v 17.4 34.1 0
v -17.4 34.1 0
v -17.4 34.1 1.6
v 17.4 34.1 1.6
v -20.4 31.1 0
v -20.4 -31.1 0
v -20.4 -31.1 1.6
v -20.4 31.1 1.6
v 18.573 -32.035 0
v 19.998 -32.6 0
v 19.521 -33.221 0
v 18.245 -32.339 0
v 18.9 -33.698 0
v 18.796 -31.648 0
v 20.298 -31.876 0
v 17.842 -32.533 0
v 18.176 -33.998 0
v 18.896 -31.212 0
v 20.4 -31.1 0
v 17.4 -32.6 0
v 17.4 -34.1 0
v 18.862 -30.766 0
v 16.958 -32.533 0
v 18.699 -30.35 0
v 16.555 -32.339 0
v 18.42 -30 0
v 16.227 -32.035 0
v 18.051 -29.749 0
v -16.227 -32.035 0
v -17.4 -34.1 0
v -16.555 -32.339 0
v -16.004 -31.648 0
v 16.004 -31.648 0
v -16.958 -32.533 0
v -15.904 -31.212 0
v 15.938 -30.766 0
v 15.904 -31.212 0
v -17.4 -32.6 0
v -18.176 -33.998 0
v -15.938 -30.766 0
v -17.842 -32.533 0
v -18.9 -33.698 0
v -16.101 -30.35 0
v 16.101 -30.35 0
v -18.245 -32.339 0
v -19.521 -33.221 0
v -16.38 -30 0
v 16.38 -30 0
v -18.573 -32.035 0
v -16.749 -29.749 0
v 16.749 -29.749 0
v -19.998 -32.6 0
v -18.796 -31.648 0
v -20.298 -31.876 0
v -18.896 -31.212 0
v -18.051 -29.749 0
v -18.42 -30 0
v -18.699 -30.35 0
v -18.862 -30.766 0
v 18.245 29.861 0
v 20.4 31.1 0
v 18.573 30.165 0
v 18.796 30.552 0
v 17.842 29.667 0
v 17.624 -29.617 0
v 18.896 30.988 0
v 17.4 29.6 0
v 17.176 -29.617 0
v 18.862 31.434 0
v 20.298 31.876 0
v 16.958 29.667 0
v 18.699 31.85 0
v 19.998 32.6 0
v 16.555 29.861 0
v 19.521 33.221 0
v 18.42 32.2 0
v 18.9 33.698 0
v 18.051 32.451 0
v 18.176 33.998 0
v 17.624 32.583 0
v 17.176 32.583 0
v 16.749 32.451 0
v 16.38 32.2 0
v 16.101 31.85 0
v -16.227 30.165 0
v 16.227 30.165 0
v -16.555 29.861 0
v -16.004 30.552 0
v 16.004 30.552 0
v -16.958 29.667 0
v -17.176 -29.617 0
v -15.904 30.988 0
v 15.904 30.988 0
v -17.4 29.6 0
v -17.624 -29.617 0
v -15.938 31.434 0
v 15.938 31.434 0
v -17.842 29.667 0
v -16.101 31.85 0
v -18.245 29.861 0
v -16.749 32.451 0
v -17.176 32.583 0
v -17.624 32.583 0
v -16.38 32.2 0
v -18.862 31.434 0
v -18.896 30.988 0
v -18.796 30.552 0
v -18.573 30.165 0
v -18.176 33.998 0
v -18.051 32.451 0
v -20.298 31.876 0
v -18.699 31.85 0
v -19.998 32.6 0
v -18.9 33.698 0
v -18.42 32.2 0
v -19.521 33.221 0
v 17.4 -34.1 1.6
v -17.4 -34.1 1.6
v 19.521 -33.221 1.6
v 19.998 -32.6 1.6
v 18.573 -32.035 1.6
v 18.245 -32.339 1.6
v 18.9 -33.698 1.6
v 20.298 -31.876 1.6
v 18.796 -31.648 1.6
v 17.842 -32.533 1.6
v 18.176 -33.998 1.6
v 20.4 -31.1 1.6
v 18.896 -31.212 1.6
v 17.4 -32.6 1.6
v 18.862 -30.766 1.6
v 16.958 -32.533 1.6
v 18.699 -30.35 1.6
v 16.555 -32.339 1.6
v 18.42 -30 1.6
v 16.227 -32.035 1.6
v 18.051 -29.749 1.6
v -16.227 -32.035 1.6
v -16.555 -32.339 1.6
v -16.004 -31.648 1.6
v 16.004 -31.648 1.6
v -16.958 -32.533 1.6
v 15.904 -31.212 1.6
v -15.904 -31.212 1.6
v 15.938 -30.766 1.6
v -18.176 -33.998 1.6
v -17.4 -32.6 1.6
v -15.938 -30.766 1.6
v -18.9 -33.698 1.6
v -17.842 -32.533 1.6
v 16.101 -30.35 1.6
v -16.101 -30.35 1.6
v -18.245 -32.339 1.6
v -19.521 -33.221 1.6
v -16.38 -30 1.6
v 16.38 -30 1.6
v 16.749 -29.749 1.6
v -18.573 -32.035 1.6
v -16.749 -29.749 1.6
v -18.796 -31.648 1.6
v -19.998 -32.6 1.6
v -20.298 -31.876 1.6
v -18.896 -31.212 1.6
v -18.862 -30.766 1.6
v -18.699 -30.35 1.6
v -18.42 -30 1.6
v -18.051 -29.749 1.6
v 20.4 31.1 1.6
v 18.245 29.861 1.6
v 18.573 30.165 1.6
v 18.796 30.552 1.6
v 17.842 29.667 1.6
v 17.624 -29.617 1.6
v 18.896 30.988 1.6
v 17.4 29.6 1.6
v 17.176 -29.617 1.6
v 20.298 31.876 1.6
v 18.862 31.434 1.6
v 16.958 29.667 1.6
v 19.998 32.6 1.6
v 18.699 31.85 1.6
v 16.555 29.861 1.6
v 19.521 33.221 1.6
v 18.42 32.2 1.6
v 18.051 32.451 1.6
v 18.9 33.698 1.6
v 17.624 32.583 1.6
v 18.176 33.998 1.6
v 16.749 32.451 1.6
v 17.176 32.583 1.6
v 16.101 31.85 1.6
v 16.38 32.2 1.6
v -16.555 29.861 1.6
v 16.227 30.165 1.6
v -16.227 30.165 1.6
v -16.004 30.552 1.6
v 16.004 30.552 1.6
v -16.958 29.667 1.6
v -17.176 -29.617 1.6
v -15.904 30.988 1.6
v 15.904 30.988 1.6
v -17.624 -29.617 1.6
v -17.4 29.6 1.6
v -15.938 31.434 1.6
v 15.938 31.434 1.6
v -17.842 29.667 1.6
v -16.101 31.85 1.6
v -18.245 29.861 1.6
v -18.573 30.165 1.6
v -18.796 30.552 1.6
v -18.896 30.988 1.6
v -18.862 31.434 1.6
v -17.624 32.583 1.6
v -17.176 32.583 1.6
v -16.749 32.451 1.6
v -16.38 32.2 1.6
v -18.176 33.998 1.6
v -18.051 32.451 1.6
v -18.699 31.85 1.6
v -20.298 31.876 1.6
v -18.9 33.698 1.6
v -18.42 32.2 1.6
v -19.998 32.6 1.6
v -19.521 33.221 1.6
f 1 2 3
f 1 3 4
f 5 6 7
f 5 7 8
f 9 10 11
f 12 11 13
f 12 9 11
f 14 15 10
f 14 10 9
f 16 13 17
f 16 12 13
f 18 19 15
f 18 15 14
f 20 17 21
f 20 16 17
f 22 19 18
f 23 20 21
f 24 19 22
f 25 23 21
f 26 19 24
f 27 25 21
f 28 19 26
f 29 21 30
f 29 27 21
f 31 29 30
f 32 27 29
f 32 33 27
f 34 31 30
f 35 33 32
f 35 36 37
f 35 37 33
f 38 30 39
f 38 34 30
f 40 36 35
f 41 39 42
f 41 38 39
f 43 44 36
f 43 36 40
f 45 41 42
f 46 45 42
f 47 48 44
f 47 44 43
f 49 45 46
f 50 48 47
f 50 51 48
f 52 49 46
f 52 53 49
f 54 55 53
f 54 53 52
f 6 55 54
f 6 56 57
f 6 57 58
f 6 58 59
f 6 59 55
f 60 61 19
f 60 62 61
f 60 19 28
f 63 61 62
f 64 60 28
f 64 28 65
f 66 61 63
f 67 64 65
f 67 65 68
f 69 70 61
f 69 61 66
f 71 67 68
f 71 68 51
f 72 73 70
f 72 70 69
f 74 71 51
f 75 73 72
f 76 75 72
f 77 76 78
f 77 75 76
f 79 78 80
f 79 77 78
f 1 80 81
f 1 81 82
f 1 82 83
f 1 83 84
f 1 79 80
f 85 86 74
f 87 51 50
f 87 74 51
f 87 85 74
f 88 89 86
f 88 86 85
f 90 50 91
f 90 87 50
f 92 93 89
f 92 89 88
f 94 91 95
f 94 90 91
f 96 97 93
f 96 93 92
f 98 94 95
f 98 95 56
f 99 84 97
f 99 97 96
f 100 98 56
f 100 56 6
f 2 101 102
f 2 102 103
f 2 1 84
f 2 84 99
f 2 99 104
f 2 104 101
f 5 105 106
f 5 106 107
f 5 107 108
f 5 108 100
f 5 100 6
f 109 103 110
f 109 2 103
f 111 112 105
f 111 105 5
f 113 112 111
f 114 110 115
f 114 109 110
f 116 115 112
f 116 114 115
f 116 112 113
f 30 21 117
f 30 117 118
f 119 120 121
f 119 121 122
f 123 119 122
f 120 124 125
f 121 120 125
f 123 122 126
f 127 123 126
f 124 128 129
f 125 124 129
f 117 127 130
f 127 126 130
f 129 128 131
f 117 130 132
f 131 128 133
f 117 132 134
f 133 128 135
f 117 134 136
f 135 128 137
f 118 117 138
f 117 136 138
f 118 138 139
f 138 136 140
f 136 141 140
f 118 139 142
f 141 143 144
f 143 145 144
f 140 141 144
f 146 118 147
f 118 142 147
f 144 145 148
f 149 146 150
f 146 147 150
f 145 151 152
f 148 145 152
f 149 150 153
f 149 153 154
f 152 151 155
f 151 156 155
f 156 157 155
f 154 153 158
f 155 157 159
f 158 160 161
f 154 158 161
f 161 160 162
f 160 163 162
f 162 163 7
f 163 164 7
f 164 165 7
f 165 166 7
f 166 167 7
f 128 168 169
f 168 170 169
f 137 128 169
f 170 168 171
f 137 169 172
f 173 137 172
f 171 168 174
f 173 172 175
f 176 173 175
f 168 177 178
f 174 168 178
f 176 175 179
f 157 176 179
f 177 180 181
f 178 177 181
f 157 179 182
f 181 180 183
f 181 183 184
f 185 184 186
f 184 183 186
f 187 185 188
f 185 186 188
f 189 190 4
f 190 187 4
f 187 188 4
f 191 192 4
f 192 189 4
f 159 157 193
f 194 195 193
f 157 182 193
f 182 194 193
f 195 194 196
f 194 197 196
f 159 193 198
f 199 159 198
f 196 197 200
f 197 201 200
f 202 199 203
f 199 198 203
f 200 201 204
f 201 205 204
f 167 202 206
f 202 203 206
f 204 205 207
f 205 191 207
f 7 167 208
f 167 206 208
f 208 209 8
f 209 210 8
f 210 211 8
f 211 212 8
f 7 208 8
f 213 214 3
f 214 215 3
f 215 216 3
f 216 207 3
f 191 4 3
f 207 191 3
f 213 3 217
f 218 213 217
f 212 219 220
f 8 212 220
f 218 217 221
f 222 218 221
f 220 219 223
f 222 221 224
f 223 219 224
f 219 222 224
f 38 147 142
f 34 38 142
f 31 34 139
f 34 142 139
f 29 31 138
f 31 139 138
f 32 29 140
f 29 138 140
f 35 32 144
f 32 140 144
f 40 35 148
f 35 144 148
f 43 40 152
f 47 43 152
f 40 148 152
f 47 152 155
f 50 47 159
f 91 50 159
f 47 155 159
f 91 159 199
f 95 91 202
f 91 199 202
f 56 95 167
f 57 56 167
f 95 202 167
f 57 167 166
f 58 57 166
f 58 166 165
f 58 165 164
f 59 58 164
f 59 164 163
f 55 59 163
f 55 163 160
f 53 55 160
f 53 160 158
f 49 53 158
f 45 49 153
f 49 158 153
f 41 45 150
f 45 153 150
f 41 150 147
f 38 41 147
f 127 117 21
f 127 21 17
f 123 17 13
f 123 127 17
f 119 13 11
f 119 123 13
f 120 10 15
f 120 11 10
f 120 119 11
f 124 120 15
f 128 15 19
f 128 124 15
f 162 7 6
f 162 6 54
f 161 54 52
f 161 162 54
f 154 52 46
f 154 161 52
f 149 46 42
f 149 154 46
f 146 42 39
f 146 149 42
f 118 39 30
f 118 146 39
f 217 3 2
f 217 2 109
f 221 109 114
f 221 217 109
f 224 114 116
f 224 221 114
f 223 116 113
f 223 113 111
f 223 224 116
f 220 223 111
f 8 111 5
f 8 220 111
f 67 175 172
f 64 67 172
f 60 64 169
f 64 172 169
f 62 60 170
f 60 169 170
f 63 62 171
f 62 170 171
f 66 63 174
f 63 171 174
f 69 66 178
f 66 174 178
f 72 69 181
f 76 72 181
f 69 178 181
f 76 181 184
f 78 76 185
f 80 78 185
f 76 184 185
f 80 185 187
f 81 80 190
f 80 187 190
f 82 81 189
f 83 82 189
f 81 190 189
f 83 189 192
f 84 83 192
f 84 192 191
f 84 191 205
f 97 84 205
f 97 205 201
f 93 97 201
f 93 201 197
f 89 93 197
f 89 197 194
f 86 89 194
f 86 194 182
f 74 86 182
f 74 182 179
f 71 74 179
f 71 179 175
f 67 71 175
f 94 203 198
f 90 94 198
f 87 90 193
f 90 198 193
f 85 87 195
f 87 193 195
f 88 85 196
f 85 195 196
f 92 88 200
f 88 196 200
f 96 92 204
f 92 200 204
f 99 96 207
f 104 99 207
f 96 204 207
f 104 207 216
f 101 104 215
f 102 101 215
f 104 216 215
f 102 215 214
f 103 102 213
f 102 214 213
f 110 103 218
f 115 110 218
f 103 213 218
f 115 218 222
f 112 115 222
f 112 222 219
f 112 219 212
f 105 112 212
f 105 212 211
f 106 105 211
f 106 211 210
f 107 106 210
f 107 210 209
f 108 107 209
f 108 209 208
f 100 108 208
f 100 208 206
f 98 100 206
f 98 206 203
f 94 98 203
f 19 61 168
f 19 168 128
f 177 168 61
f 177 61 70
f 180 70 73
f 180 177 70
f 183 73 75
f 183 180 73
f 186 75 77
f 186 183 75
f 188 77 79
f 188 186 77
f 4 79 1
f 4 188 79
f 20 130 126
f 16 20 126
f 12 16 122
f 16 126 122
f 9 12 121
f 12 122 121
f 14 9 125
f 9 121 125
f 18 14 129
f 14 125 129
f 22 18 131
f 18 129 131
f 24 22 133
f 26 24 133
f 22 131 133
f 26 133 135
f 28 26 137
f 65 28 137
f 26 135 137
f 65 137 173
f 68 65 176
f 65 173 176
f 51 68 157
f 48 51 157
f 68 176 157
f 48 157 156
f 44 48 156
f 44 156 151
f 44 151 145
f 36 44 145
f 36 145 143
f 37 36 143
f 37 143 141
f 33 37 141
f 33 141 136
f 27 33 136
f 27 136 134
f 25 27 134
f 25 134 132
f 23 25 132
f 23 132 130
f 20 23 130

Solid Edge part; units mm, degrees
sketch "Sketch1" plane through (0, 0, 0) normal (0, 0, 1) x (1, 0, 0)
  line L0 (-20.4, 34.1) -> (20.4, 34.1)
  line L1 (20.4, 34.1) -> (20.4, -34.1)
  line L2 (20.4, -34.1) -> (-20.4, -34.1)
  line L3 (-20.4, -34.1) -> (-20.4, 34.1)
  dimension "D1" = 68.2
  dimension "D2" = 40.8
extrude "Protrusion1" add sketch "Sketch1" along normal blind 1.6
fillet "Round_1" radius 3 4 edges at (20.4, -34.1, 0.8) (20.4, 34.1, 0.8) (-20.4, 34.1, 0.8) (-20.4, -34.1, 0.8)
hole "Hole_1" at (-17.4, 31.1, 1.6) direction (0, 0, -1) diameter 3 end up to next
hole "Hole1" at (17.4, 31.1, 1.6) direction (0, 0, -1) diameter 3 end up to next
hole "Hole2" at (17.4, -31.1, 1.6) direction (0, 0, -1) diameter 3 end up to next
hole "Hole3" at (-17.4, -31.1, 1.6) direction (0, 0, -1) diameter 3 end up to next
